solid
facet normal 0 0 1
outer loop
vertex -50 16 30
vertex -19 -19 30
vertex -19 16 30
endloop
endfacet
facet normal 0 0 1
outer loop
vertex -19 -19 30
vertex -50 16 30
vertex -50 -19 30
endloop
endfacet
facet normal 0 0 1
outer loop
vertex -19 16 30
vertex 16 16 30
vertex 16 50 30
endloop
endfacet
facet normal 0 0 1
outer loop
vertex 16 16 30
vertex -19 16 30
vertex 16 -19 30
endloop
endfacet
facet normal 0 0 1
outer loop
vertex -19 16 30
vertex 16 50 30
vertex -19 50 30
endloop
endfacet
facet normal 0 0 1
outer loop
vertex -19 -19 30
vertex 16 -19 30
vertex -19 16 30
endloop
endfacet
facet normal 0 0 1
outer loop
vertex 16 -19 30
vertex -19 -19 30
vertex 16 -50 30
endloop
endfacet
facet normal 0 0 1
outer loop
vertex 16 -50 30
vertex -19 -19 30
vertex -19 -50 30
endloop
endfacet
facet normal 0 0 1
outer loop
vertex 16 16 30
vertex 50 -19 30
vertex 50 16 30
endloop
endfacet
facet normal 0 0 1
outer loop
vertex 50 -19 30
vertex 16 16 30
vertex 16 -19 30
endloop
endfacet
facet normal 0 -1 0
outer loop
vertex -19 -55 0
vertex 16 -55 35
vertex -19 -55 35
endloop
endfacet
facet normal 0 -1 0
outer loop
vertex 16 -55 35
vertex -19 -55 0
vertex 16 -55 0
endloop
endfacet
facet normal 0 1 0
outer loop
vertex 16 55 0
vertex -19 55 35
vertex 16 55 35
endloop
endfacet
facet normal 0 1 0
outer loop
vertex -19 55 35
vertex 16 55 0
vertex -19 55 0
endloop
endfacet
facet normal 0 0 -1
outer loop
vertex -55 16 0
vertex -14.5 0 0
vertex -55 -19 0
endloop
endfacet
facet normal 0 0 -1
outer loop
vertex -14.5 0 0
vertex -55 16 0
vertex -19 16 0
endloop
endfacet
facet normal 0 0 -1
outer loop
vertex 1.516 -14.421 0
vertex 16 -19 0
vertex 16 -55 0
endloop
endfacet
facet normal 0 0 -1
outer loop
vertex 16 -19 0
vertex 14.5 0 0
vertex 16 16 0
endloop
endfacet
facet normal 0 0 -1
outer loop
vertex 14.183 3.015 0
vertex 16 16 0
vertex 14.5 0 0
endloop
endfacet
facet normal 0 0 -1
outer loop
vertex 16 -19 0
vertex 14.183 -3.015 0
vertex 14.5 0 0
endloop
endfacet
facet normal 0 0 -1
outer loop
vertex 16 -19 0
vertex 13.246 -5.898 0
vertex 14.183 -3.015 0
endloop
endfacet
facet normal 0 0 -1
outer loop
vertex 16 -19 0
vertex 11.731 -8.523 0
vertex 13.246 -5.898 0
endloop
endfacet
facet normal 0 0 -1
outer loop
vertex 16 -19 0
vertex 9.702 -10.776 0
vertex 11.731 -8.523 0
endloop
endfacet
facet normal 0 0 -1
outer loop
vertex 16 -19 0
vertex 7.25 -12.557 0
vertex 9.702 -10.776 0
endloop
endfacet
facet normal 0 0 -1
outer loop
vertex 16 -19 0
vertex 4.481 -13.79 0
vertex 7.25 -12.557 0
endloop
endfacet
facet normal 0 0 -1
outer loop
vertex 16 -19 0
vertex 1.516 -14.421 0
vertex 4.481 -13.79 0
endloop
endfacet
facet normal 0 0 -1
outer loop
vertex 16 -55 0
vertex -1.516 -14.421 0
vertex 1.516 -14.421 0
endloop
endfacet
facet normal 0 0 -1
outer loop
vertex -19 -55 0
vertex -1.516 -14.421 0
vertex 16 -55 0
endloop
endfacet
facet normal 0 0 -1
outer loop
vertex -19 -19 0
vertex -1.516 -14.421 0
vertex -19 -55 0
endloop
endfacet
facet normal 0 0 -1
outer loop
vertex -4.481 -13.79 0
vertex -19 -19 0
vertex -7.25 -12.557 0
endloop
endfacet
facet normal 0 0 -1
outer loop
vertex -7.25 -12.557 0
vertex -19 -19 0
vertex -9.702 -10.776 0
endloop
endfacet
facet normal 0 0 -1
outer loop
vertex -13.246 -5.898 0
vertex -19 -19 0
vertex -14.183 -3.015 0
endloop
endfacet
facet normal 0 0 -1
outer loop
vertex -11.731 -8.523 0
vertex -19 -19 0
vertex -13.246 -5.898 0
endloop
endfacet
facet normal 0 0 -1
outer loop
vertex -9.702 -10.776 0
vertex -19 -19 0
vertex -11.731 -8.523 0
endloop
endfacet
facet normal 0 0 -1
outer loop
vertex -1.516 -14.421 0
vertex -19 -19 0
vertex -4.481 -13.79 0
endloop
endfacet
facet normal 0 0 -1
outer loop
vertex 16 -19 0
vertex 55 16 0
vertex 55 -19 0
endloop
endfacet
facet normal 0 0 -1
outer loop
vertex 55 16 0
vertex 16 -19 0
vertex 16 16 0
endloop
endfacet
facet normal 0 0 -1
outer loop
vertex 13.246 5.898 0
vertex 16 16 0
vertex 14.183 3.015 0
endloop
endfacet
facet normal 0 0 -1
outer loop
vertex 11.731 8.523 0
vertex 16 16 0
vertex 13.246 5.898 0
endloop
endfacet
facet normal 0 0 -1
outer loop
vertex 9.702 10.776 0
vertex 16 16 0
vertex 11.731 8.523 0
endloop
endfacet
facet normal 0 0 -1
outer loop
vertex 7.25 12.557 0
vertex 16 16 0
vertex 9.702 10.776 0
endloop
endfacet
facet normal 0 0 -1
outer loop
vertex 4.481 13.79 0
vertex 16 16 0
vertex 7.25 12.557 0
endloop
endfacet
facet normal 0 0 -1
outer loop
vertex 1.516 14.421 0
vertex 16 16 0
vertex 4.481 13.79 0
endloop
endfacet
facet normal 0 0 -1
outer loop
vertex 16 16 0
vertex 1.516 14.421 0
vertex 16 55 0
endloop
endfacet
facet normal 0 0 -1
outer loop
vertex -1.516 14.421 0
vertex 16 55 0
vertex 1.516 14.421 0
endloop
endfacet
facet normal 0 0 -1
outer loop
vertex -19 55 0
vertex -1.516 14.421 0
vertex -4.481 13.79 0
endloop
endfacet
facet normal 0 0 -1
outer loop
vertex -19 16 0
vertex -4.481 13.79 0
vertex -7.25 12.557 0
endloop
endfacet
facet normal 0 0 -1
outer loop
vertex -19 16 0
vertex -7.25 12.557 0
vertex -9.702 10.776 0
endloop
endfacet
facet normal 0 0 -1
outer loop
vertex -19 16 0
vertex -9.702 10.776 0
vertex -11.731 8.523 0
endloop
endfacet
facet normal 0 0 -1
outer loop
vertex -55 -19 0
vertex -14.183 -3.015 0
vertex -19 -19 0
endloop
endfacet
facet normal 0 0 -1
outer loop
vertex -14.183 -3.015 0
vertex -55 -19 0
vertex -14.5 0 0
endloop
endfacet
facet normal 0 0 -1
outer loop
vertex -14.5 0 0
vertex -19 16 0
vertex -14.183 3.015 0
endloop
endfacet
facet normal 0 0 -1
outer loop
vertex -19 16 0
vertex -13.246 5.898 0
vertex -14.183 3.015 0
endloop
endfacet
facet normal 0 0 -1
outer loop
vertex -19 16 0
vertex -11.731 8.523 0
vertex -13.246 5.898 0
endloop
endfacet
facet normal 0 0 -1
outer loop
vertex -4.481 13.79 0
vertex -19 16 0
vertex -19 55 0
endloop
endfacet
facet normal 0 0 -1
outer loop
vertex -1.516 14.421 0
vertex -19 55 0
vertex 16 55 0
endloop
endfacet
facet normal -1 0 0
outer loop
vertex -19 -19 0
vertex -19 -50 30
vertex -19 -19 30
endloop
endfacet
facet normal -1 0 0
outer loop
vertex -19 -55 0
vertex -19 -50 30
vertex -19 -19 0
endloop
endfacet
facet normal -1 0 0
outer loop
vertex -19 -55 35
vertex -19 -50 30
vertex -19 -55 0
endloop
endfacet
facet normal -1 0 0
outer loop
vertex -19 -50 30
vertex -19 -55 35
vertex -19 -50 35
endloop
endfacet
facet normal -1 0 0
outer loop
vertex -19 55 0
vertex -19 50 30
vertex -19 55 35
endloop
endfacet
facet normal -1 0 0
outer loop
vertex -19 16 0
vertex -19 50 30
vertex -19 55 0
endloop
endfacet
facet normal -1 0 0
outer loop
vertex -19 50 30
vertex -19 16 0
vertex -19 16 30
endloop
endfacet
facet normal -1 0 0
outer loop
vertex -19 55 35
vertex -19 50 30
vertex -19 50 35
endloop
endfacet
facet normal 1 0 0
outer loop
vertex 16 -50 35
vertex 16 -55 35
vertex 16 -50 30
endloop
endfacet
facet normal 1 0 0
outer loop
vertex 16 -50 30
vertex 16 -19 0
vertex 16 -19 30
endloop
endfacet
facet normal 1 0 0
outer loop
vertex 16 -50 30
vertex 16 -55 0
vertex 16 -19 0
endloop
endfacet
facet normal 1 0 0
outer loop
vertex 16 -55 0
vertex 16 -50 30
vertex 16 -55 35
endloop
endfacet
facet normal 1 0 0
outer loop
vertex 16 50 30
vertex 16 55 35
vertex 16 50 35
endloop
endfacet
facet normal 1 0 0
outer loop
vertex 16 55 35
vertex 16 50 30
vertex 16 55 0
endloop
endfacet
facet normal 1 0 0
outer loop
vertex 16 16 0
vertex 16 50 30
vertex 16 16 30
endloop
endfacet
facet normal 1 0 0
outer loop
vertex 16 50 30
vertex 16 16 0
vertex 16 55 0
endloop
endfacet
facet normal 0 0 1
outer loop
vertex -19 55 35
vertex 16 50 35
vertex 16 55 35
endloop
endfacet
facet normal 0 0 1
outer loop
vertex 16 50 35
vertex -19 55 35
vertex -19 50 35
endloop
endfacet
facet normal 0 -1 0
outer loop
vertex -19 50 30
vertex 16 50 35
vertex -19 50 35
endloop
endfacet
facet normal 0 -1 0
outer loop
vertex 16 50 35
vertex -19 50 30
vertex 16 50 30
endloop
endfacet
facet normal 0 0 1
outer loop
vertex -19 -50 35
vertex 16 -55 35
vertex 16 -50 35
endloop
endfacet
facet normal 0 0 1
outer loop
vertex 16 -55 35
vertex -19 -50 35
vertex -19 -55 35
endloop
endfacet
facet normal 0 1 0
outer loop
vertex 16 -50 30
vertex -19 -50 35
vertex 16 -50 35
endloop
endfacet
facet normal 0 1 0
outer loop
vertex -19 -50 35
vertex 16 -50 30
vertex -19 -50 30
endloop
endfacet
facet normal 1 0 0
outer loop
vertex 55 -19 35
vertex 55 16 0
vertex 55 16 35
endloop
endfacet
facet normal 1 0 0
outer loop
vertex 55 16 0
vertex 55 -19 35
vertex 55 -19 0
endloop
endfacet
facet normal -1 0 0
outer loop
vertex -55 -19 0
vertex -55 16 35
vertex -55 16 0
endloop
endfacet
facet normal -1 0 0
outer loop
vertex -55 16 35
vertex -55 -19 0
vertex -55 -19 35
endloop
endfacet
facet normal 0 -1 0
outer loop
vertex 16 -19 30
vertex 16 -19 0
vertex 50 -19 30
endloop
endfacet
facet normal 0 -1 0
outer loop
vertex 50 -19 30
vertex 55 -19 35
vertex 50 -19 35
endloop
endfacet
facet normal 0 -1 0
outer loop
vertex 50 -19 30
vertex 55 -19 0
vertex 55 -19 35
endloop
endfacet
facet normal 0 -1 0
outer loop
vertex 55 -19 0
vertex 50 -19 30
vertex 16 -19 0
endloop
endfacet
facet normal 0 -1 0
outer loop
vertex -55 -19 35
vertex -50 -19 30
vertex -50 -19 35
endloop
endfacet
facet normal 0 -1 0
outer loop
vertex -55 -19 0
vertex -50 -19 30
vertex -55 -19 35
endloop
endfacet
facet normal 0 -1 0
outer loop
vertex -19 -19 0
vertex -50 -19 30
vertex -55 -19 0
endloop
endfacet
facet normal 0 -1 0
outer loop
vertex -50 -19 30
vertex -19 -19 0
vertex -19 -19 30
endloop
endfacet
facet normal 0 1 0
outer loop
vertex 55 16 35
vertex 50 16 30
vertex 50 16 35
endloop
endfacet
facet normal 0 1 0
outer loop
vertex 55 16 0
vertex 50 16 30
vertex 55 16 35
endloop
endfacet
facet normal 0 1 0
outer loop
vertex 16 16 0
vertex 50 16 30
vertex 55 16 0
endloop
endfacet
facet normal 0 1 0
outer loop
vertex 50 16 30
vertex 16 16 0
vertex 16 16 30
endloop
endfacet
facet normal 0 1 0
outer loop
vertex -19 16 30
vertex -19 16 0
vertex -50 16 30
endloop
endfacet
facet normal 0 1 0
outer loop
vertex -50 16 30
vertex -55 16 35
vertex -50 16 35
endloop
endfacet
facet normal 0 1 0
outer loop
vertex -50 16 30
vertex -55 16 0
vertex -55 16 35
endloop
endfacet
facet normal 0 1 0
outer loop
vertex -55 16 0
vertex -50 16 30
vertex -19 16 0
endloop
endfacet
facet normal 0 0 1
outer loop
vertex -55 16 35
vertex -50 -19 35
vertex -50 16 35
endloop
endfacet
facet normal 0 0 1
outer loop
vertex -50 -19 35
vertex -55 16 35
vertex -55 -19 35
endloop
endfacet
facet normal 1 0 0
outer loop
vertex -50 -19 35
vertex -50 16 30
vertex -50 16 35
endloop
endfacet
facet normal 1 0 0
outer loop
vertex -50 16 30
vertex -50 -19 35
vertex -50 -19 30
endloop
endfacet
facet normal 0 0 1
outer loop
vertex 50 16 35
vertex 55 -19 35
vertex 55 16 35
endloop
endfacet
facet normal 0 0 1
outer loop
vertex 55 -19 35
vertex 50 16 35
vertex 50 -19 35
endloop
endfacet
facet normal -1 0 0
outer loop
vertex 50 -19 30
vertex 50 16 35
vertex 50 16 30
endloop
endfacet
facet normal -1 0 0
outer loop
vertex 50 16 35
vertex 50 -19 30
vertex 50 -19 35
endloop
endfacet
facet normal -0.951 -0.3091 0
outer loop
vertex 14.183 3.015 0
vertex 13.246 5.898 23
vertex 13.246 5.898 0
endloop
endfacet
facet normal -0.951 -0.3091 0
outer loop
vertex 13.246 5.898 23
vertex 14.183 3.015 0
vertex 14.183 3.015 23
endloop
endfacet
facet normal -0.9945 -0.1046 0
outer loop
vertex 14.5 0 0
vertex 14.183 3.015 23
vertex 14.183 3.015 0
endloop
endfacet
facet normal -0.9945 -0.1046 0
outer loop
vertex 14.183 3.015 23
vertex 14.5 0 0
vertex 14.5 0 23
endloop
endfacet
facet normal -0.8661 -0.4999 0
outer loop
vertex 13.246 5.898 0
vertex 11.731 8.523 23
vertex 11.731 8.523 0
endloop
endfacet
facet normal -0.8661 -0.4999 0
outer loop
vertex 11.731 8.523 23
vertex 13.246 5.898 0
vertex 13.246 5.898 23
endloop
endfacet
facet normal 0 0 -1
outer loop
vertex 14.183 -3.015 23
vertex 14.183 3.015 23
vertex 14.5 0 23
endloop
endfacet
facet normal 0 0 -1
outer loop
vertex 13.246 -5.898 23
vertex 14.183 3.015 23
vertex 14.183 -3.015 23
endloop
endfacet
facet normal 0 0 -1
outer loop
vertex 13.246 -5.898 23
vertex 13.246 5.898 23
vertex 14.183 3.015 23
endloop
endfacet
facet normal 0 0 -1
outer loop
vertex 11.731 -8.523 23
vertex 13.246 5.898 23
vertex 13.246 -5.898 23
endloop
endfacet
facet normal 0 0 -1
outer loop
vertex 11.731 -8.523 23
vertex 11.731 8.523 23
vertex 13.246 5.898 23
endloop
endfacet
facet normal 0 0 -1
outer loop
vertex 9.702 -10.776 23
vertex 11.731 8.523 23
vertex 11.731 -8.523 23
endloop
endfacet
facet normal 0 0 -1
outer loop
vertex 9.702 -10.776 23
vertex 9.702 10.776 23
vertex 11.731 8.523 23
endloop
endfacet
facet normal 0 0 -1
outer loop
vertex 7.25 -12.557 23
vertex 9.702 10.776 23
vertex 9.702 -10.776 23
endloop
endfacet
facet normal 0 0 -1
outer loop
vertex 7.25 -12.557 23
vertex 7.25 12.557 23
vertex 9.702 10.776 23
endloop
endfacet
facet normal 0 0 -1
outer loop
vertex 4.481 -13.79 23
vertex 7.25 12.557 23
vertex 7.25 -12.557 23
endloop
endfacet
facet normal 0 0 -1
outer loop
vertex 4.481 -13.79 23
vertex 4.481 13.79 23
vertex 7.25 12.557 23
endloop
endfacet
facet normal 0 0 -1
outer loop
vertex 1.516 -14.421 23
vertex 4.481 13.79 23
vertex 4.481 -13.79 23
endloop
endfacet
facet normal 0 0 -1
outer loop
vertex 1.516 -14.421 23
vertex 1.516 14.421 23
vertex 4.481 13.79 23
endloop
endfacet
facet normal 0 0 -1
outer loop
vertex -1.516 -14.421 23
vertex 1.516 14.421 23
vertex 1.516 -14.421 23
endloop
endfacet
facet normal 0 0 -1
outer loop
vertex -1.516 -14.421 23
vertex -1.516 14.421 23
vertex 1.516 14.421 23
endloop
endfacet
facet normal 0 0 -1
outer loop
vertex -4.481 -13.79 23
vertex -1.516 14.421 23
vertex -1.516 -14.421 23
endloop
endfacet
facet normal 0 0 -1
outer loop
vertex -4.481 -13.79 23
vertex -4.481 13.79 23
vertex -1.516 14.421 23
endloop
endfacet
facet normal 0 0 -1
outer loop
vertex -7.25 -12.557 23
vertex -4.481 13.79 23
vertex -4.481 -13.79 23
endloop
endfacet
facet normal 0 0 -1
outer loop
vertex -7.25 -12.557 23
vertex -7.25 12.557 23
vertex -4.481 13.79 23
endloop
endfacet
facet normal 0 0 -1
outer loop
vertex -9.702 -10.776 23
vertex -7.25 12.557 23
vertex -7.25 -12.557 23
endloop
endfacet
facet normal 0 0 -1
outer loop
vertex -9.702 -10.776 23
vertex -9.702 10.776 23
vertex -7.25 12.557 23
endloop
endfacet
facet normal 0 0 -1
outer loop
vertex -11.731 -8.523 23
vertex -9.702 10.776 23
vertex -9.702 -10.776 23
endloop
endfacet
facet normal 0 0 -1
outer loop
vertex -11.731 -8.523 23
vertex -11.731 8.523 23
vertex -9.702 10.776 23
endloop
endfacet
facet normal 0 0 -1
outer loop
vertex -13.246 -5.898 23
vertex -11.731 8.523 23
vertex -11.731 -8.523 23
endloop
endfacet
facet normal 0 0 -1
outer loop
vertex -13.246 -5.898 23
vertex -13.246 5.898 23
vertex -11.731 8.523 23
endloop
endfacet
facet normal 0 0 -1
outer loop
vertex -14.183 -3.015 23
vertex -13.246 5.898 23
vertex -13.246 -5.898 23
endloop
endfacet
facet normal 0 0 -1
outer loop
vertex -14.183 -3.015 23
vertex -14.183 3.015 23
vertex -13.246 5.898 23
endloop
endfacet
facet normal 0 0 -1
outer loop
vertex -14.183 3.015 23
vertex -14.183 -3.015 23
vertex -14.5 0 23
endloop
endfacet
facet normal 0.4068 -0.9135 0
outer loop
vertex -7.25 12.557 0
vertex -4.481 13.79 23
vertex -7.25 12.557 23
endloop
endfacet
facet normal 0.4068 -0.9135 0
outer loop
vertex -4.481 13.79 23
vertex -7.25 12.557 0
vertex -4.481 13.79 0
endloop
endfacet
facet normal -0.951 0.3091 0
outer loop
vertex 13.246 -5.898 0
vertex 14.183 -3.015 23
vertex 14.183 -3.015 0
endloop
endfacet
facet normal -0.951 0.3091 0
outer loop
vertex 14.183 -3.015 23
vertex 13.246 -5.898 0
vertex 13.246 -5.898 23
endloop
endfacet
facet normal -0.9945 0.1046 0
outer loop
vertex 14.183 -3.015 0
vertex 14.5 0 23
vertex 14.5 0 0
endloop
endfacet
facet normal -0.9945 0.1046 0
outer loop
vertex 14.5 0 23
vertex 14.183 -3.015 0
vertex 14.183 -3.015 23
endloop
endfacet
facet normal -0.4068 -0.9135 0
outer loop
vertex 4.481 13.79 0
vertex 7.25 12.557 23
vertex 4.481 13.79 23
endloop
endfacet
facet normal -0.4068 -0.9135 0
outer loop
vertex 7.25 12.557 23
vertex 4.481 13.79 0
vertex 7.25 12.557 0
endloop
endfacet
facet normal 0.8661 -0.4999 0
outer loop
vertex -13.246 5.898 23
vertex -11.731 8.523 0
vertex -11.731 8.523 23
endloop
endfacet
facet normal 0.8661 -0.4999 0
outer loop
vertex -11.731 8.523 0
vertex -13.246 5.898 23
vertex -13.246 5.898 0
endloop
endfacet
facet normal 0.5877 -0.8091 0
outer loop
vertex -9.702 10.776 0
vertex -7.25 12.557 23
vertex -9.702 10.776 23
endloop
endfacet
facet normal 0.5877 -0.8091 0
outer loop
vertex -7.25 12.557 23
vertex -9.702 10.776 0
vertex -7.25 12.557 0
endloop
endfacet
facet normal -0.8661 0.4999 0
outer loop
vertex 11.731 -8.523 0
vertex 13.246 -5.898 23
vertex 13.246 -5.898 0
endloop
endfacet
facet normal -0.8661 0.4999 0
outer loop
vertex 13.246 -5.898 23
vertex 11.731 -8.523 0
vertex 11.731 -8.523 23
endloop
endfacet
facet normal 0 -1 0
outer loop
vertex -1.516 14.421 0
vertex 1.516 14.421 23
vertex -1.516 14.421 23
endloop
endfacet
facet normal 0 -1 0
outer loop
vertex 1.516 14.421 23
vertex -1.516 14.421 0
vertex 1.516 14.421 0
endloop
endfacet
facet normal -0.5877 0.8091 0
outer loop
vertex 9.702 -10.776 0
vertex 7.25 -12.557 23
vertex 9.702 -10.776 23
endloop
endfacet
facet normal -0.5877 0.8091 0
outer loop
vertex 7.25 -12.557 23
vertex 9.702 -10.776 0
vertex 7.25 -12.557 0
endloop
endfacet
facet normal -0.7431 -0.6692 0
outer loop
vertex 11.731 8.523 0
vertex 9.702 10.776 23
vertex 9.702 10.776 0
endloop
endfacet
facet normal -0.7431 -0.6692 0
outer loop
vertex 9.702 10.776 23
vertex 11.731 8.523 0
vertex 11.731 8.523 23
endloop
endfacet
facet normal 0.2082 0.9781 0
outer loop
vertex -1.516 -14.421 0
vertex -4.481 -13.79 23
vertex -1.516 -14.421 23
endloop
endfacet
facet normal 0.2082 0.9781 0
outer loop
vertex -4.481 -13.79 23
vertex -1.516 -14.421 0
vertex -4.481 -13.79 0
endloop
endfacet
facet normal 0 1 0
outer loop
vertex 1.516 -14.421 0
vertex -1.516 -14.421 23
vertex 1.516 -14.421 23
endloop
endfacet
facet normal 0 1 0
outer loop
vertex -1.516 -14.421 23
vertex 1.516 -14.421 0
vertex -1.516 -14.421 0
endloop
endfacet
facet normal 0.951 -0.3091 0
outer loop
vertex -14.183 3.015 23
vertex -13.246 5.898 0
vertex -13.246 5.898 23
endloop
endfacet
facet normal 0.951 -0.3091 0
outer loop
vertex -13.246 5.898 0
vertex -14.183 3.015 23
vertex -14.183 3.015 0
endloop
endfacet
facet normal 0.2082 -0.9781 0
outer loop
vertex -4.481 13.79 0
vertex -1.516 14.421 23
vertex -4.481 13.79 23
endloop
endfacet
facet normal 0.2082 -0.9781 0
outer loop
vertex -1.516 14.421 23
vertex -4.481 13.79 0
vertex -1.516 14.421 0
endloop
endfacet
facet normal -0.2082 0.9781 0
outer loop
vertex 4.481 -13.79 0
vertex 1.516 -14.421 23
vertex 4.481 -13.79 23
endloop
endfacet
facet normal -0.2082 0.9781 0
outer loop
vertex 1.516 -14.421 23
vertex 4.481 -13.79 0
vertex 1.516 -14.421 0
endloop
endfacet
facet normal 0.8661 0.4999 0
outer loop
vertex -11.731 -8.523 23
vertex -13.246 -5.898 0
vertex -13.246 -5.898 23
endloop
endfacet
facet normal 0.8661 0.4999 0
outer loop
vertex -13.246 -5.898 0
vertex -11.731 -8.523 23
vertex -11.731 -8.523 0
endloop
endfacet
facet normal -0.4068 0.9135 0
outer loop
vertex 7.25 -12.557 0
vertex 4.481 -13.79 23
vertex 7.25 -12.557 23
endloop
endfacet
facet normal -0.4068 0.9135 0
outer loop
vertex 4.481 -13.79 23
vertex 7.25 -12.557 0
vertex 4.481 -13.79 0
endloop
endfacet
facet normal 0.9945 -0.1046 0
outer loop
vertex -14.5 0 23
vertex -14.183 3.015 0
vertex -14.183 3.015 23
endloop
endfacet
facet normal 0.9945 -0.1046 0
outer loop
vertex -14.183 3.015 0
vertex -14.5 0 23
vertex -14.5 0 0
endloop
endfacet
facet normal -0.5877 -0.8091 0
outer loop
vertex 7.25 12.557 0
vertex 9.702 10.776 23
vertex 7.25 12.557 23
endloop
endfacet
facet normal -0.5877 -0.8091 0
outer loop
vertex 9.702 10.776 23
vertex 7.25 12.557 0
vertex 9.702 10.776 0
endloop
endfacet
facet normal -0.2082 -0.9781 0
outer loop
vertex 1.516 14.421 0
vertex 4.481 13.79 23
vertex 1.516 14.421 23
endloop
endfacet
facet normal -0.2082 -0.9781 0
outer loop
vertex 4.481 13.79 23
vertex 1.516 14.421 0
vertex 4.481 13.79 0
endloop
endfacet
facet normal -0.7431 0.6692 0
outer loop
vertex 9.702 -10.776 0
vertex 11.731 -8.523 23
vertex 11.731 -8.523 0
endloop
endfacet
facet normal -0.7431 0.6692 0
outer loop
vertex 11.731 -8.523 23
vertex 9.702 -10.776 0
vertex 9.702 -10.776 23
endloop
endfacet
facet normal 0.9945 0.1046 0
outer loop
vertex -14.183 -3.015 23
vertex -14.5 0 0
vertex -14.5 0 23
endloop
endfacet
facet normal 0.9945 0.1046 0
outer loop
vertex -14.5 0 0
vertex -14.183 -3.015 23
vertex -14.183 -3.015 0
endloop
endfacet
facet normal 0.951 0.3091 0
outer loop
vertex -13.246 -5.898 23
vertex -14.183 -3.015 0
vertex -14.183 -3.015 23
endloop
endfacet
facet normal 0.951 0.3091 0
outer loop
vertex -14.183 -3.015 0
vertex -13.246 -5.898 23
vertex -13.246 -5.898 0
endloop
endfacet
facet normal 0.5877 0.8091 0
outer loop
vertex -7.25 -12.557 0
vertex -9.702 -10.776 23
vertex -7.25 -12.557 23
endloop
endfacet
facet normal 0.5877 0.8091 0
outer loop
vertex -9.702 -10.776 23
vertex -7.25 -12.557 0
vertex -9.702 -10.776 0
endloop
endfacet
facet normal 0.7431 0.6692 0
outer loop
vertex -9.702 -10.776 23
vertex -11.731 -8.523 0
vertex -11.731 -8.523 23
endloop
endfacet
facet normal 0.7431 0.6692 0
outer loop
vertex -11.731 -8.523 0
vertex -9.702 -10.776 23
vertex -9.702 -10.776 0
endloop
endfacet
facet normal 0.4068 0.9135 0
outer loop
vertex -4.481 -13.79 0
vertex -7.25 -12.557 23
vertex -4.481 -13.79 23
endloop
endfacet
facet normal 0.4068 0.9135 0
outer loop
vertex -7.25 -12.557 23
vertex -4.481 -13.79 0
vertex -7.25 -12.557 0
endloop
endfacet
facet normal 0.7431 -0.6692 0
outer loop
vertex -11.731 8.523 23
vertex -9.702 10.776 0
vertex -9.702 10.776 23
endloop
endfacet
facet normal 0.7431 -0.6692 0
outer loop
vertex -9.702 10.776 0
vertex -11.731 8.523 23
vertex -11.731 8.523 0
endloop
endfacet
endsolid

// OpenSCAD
difference() {
  union(){
    cylinder(d1=32, d2=32, h=30);    
    translate([0,55,-5])
    rotate([90,270,0]){
      translate([5, -16, 0]){
        cube([30, 35, 110]);
      }
      translate([20, -16, 0]){
        cube([20, 35, 5]);
      }
      translate([20, -16, 105]){
        cube([20, 35, 5]);
      }      
    }
    translate([-55, 0, -5])
    rotate([180,270,0]){
      translate([5, -16, 0]){
        cube([30, 35, 110]);
      }
      translate([20, -16, 0]){
        cube([20, 35, 5]);
      }
      translate([20, -16, 105]){
        cube([20, 35, 5]);
      }      
    }
  }
  translate([0,0,-2])
  cylinder(d1=29, d2=29, h=25);
}
